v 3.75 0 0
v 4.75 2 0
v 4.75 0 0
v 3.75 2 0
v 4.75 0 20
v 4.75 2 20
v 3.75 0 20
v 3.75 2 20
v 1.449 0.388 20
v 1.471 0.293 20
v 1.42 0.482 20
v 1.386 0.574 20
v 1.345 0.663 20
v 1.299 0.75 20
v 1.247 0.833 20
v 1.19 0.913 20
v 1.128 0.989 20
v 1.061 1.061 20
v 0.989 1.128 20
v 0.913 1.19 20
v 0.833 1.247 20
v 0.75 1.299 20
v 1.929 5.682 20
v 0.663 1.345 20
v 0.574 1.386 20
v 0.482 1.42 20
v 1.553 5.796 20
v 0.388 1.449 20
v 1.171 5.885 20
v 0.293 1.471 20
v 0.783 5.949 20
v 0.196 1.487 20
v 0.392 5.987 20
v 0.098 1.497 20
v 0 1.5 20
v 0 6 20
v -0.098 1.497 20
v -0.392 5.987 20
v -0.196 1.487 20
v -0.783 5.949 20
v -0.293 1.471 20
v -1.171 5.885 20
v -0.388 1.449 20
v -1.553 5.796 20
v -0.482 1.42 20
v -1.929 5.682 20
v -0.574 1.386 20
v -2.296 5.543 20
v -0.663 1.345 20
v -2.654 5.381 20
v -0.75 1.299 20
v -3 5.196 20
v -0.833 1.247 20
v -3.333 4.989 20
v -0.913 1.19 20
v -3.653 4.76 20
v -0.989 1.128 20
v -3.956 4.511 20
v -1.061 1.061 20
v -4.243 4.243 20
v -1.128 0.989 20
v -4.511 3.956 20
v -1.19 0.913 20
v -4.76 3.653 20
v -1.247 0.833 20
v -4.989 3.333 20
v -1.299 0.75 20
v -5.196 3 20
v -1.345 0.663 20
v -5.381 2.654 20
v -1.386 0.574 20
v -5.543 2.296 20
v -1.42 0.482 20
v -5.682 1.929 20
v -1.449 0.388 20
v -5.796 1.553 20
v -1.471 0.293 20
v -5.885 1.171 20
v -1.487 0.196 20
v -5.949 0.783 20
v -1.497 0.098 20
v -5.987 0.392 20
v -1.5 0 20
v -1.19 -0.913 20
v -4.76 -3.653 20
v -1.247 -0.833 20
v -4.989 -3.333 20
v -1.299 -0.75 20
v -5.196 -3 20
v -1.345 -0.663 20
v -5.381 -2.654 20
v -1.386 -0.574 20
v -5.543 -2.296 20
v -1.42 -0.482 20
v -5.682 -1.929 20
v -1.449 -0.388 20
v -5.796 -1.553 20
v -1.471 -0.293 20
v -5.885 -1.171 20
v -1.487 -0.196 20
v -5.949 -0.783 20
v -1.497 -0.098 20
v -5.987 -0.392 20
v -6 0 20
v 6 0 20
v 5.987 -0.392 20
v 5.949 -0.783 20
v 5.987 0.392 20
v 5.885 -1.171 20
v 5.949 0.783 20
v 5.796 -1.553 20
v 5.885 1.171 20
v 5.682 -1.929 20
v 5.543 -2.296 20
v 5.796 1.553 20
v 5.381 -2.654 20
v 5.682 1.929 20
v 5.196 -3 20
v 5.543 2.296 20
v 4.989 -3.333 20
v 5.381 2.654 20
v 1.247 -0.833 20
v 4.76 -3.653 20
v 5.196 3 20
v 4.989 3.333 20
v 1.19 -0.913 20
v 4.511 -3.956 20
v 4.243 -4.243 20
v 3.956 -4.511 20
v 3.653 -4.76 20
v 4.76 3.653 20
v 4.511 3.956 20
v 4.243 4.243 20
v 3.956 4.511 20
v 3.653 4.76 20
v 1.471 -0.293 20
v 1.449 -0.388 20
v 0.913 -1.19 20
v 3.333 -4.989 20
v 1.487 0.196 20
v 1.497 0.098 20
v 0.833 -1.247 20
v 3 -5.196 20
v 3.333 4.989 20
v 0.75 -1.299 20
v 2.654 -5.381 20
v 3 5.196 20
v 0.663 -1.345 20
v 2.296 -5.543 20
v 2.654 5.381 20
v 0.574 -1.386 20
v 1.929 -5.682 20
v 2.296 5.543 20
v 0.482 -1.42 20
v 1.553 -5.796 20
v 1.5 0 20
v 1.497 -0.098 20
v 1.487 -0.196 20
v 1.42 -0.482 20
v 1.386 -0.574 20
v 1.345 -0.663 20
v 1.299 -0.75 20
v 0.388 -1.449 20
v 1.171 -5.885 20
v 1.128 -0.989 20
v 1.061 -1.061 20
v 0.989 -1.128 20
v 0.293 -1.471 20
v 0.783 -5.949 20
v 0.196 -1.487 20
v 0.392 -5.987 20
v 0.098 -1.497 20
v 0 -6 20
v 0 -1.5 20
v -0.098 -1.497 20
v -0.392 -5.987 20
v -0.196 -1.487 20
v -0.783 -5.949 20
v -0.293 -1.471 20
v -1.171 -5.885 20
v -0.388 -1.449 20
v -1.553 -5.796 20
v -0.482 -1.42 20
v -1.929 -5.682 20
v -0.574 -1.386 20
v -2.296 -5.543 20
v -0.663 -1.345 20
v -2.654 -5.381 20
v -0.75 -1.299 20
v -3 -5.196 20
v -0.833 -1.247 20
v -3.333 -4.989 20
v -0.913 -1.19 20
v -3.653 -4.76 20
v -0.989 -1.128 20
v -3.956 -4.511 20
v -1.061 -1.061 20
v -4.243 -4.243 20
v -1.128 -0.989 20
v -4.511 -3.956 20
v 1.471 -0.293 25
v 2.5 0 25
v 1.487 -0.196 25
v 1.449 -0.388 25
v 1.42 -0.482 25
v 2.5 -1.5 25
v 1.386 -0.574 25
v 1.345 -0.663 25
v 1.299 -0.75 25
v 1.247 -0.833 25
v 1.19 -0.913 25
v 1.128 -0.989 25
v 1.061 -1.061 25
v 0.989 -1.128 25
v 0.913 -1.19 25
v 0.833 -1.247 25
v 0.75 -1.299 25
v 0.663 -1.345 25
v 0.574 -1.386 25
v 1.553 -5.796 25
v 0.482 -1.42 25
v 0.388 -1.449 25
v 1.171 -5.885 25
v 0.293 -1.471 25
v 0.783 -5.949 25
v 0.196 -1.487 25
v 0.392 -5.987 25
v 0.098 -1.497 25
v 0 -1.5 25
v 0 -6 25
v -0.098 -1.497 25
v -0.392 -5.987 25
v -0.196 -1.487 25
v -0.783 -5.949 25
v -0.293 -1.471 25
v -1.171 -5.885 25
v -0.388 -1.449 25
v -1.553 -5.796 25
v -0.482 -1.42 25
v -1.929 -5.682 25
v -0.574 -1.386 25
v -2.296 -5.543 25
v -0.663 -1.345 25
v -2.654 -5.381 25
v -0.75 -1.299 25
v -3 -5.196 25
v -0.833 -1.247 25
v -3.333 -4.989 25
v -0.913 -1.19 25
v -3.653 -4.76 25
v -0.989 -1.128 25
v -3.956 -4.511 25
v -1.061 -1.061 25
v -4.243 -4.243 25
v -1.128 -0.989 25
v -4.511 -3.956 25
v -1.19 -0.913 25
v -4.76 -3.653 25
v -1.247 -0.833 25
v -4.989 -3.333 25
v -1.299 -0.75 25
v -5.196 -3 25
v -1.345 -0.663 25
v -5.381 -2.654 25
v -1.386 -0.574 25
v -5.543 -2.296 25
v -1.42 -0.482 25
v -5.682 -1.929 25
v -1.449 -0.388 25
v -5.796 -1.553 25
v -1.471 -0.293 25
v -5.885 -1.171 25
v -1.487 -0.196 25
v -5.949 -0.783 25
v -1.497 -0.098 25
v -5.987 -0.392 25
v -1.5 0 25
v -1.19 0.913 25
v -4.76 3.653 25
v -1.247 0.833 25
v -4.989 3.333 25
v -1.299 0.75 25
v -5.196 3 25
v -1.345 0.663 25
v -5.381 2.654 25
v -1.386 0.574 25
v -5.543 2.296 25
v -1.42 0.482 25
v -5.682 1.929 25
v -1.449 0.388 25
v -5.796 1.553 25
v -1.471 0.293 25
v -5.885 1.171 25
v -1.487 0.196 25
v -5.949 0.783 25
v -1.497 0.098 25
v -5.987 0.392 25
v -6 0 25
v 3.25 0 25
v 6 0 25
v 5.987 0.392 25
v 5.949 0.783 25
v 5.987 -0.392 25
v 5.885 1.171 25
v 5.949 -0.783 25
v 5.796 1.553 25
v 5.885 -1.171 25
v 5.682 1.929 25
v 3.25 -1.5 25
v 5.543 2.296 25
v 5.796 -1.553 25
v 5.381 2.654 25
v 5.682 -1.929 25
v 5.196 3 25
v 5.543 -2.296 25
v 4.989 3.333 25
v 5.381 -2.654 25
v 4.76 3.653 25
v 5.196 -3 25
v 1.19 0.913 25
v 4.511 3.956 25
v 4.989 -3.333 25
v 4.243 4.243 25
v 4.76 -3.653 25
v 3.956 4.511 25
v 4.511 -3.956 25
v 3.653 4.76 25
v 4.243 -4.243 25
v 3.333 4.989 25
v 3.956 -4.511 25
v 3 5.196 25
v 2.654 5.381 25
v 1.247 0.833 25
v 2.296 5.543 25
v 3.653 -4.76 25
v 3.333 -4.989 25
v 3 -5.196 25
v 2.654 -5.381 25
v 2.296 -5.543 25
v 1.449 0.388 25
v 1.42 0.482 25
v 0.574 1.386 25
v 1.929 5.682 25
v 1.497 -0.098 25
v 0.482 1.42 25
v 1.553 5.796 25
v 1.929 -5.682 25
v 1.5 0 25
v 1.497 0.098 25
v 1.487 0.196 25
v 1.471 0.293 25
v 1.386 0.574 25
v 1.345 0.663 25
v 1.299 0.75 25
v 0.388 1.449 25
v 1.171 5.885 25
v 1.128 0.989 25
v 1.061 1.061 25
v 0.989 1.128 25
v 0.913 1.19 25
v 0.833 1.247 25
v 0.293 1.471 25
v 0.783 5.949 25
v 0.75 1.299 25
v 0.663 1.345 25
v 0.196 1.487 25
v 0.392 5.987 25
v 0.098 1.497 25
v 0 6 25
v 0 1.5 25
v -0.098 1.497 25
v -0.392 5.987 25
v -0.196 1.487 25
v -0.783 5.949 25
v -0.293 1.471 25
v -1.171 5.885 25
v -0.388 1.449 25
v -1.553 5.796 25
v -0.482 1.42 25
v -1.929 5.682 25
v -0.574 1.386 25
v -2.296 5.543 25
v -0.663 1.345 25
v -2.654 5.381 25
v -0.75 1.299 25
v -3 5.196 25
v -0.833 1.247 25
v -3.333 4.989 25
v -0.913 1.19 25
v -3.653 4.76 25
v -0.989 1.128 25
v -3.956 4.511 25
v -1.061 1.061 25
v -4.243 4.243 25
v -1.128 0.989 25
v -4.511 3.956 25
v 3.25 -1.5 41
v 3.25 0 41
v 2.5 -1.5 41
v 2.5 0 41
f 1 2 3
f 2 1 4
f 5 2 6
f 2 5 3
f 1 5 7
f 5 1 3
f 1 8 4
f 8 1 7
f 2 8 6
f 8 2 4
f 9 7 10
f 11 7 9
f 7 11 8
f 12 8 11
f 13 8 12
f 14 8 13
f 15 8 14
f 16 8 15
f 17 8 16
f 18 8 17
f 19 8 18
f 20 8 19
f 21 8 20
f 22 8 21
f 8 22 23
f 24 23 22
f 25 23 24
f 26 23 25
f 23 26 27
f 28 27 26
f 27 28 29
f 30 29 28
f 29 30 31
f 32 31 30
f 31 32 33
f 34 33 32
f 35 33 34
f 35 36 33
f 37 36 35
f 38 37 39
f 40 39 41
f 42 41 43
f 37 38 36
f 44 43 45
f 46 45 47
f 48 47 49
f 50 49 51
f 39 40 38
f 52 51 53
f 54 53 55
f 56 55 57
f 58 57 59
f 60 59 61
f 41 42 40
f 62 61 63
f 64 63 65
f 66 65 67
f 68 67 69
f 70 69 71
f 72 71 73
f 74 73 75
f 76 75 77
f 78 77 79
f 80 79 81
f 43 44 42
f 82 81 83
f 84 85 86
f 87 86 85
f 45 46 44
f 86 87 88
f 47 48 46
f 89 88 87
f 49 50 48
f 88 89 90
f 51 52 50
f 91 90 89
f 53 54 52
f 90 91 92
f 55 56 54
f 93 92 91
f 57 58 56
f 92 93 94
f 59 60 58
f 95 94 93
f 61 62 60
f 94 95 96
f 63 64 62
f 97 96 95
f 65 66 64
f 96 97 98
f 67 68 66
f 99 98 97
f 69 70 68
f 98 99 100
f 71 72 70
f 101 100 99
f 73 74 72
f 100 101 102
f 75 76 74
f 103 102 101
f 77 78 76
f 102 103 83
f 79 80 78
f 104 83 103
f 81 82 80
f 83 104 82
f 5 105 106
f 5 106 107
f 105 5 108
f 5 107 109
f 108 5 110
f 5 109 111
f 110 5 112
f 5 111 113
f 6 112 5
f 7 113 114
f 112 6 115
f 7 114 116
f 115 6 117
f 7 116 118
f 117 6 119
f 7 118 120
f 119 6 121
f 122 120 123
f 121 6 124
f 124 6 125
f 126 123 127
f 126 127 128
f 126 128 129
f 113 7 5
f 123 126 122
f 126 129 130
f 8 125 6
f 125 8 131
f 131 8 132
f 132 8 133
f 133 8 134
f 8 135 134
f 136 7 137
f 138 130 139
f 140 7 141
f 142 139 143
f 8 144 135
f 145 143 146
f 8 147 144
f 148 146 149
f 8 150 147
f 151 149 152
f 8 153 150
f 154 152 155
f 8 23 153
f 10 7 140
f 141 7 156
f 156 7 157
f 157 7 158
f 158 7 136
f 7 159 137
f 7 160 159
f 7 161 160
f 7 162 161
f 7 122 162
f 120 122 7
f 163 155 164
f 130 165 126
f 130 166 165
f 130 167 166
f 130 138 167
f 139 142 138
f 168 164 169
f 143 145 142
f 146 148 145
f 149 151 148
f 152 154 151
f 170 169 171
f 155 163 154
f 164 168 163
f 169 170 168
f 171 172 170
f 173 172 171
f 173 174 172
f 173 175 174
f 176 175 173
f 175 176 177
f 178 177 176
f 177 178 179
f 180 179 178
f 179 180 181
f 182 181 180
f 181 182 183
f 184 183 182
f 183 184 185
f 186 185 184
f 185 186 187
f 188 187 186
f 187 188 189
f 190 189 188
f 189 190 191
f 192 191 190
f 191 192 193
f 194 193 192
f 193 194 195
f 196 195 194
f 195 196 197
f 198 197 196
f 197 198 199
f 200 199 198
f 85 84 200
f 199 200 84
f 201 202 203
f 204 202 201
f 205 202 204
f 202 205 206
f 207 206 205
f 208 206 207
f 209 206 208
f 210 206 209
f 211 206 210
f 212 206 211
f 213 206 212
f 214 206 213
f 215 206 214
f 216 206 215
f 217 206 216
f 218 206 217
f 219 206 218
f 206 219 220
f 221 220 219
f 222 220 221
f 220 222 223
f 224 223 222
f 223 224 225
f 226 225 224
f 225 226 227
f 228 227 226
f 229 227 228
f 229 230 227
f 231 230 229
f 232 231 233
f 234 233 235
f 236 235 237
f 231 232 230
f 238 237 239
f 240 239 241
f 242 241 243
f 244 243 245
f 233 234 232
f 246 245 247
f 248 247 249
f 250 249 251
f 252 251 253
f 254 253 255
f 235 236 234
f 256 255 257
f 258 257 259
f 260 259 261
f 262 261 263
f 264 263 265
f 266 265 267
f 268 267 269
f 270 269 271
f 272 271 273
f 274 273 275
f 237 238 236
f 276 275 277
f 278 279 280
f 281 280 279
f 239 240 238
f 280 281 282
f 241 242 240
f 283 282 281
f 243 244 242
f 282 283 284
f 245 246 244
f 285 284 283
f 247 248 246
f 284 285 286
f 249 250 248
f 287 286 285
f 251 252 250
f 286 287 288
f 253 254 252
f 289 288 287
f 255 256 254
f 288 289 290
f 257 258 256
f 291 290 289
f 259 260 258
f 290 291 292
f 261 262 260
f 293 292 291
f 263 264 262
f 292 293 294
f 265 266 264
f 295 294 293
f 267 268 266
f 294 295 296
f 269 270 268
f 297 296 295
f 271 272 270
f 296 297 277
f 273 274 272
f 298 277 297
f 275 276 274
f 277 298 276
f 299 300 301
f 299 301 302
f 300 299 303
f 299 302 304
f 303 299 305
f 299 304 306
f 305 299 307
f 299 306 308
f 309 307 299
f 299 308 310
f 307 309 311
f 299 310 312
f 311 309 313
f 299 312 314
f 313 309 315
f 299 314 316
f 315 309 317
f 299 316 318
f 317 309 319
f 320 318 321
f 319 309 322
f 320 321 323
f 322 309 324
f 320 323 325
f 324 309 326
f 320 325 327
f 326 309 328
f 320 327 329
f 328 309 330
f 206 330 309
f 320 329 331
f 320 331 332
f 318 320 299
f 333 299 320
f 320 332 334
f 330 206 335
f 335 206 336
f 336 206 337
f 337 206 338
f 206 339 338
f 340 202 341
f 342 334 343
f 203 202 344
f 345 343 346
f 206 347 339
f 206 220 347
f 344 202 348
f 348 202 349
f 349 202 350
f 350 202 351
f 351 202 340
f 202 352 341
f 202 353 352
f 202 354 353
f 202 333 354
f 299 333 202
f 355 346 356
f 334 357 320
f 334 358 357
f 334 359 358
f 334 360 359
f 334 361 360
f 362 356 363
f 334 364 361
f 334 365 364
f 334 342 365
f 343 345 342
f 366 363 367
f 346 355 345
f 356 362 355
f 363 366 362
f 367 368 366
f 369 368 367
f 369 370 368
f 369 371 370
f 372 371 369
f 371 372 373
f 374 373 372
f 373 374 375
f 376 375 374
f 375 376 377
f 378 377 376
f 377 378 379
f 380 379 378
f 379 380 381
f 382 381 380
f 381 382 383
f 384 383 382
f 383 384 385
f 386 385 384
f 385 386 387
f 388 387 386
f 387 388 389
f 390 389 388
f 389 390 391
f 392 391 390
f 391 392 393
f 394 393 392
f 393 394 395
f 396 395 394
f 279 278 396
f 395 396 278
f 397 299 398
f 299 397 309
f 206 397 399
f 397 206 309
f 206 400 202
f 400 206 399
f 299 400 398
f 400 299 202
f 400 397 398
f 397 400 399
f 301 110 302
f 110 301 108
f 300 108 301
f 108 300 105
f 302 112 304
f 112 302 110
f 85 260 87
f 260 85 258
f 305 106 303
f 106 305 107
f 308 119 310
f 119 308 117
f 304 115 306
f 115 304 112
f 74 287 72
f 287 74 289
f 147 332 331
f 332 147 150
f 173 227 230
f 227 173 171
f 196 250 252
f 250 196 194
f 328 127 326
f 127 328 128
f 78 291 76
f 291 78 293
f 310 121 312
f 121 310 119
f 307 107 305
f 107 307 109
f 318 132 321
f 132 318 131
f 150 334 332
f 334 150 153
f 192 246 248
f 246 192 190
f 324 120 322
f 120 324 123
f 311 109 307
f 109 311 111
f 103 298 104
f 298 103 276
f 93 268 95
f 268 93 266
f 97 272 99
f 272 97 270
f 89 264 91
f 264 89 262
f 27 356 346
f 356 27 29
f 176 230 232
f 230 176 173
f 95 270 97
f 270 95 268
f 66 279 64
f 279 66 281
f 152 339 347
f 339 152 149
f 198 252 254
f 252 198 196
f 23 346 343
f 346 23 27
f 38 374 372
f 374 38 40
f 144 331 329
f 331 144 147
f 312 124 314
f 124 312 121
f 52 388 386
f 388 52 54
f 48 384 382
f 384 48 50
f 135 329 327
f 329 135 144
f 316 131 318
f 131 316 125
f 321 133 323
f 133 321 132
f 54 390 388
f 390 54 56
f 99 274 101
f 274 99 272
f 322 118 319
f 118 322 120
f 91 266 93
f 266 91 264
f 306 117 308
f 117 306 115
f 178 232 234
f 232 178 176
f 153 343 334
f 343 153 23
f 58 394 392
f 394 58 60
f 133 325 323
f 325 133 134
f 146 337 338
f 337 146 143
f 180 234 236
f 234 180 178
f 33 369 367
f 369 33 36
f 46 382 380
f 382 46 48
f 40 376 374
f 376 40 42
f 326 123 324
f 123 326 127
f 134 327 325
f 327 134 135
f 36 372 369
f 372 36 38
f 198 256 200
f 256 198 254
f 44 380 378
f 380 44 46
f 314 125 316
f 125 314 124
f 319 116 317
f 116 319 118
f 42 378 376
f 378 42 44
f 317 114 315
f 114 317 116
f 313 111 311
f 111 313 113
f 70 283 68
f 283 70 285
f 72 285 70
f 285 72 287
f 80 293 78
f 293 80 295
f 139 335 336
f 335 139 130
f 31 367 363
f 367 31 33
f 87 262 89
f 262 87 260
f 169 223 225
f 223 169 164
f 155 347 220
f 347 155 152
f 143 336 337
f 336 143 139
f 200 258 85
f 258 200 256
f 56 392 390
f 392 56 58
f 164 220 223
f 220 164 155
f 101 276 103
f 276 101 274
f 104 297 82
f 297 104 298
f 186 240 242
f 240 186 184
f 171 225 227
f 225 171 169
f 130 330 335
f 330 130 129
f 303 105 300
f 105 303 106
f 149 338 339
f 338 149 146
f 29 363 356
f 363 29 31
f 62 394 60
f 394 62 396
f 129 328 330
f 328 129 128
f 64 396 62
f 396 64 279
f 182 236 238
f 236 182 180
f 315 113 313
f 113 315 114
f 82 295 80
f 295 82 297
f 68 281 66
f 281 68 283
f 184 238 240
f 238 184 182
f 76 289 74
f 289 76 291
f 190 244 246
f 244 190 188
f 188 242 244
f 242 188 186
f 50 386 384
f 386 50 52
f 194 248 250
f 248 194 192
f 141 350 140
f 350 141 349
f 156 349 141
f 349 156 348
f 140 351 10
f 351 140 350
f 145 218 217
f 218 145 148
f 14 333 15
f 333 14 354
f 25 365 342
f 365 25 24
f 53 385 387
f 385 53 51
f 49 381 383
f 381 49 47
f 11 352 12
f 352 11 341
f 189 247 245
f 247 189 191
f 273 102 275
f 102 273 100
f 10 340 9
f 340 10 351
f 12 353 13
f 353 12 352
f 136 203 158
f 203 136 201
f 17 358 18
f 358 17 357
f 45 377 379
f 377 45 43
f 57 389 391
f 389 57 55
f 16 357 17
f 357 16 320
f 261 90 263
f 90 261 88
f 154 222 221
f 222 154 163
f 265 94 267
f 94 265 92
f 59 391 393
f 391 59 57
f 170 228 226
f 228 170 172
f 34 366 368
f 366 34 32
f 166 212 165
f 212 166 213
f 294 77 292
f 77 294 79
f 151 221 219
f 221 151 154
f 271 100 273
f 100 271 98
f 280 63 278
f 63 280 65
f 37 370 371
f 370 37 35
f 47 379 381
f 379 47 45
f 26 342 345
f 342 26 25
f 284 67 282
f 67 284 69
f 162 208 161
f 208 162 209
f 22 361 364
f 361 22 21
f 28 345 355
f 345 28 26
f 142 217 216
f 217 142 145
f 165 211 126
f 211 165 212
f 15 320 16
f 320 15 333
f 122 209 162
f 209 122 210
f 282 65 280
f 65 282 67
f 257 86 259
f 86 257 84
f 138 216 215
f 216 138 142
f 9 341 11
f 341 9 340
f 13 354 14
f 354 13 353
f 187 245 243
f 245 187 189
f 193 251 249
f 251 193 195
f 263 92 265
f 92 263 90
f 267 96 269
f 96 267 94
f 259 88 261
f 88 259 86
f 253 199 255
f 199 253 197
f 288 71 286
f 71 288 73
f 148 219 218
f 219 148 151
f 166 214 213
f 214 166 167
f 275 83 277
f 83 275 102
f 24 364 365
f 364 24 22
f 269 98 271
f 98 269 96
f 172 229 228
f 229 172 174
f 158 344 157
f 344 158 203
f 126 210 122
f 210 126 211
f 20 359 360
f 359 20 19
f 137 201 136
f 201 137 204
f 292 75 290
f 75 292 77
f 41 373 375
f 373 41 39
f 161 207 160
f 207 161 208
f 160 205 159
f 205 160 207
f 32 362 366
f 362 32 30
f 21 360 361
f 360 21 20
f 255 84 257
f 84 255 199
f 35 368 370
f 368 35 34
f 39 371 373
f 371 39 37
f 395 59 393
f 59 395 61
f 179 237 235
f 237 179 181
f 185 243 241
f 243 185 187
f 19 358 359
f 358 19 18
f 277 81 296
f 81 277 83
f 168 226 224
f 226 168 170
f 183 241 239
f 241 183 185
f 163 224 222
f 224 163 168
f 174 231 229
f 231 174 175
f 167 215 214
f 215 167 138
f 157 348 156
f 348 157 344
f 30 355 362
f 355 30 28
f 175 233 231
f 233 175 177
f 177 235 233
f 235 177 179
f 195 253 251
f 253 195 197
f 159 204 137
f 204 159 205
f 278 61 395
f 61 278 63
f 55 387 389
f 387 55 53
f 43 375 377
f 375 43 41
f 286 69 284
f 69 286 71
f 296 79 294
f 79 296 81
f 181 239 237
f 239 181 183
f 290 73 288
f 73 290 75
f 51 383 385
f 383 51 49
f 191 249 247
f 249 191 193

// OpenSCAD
// Straight hose-barb reducer: joins 8 mm ID silicone tubing to 5 mm ID silicone tubing
// Print orientation: standing upright along +Z, centred on origin in X/Y
// Units: mm. All cutting shapes extend past faces to avoid coplanar surfaces.

// ---------------- Parameters ----------------
reducer_d        = 12;   // collar outer diameter (z = 20 to 25)
barb8_base_d     = 7.5;  // 8 mm tubing barb outer diameter at bottom
barb8_top_d      = 9.5;  // 8 mm tubing barb outer diameter at top
barb8_height     = 10;   // 8 mm tubing barb height
barb8_start_z    = 0;    // 8 mm tubing barb stack start height
barb8_step_d     = barb8_top_d - barb8_base_d;  // sawtooth rise (7.5 -> 9.5)

barb5_base_d     = 6.5;  // 5 mm tubing barb outer diameter at bottom
barb5_top_d      = 5.0;  // 5 mm tubing barb outer diameter at top
barb5_height     = 8;    // 5 mm tubing barb height
barb5_start_z    = 25;   // 5 mm tubing barb stack start height
barb5_step_d     = barb5_top_d - barb5_base_d;  // sawtooth fall (6.5 -> 5.0)

bore_d           = 3;    // through-bore diameter (full length)
eps              = 0.5;  // overshoot for clean boolean cuts
$fn              = 96;   // curve resolution

// ---------------- Model ----------------
difference() {
    union() {
        // 8 mm tubing barbs: two stacked, sawtooth profile
        for (i = [0 : 1])
            translate([0, 0, barb8_start_z + i * barb8_height])
                linear_extrude(height = barb8_height)
                    polygon([
                        [0, 0],
                        [barb8_base_d / 2, 0],
                        [barb8_base_d / 2, barb8_step_d],
                        [barb8_top_d / 2, barb8_step_d],
                        [barb8_top_d / 2, 0]
                    ]);

        // Cylindrical collar (z = 20 to 25)
        translate([0, 0, 20])
            cylinder(d = reducer_d, h = 5);

        // 5 mm tubing barbs: two stacked, sawtooth profile
        for (i = [0 : 1])
            translate([0, 0, barb5_start_z + i * barb5_height])
                linear_extrude(height = barb5_height)
                    polygon([
                        [0, 0],
                        [barb5_base_d / 2, 0],
                        [barb5_base_d / 2, barb5_step_d],
                        [barb5_top_d / 2, barb5_step_d],
                        [barb5_top_d / 2, 0]
                    ]);
    }

    // Through-bore along Z
    translate([0, 0, -eps])
        cylinder(d = bore_d, h = 41 + 2 * eps);
}
